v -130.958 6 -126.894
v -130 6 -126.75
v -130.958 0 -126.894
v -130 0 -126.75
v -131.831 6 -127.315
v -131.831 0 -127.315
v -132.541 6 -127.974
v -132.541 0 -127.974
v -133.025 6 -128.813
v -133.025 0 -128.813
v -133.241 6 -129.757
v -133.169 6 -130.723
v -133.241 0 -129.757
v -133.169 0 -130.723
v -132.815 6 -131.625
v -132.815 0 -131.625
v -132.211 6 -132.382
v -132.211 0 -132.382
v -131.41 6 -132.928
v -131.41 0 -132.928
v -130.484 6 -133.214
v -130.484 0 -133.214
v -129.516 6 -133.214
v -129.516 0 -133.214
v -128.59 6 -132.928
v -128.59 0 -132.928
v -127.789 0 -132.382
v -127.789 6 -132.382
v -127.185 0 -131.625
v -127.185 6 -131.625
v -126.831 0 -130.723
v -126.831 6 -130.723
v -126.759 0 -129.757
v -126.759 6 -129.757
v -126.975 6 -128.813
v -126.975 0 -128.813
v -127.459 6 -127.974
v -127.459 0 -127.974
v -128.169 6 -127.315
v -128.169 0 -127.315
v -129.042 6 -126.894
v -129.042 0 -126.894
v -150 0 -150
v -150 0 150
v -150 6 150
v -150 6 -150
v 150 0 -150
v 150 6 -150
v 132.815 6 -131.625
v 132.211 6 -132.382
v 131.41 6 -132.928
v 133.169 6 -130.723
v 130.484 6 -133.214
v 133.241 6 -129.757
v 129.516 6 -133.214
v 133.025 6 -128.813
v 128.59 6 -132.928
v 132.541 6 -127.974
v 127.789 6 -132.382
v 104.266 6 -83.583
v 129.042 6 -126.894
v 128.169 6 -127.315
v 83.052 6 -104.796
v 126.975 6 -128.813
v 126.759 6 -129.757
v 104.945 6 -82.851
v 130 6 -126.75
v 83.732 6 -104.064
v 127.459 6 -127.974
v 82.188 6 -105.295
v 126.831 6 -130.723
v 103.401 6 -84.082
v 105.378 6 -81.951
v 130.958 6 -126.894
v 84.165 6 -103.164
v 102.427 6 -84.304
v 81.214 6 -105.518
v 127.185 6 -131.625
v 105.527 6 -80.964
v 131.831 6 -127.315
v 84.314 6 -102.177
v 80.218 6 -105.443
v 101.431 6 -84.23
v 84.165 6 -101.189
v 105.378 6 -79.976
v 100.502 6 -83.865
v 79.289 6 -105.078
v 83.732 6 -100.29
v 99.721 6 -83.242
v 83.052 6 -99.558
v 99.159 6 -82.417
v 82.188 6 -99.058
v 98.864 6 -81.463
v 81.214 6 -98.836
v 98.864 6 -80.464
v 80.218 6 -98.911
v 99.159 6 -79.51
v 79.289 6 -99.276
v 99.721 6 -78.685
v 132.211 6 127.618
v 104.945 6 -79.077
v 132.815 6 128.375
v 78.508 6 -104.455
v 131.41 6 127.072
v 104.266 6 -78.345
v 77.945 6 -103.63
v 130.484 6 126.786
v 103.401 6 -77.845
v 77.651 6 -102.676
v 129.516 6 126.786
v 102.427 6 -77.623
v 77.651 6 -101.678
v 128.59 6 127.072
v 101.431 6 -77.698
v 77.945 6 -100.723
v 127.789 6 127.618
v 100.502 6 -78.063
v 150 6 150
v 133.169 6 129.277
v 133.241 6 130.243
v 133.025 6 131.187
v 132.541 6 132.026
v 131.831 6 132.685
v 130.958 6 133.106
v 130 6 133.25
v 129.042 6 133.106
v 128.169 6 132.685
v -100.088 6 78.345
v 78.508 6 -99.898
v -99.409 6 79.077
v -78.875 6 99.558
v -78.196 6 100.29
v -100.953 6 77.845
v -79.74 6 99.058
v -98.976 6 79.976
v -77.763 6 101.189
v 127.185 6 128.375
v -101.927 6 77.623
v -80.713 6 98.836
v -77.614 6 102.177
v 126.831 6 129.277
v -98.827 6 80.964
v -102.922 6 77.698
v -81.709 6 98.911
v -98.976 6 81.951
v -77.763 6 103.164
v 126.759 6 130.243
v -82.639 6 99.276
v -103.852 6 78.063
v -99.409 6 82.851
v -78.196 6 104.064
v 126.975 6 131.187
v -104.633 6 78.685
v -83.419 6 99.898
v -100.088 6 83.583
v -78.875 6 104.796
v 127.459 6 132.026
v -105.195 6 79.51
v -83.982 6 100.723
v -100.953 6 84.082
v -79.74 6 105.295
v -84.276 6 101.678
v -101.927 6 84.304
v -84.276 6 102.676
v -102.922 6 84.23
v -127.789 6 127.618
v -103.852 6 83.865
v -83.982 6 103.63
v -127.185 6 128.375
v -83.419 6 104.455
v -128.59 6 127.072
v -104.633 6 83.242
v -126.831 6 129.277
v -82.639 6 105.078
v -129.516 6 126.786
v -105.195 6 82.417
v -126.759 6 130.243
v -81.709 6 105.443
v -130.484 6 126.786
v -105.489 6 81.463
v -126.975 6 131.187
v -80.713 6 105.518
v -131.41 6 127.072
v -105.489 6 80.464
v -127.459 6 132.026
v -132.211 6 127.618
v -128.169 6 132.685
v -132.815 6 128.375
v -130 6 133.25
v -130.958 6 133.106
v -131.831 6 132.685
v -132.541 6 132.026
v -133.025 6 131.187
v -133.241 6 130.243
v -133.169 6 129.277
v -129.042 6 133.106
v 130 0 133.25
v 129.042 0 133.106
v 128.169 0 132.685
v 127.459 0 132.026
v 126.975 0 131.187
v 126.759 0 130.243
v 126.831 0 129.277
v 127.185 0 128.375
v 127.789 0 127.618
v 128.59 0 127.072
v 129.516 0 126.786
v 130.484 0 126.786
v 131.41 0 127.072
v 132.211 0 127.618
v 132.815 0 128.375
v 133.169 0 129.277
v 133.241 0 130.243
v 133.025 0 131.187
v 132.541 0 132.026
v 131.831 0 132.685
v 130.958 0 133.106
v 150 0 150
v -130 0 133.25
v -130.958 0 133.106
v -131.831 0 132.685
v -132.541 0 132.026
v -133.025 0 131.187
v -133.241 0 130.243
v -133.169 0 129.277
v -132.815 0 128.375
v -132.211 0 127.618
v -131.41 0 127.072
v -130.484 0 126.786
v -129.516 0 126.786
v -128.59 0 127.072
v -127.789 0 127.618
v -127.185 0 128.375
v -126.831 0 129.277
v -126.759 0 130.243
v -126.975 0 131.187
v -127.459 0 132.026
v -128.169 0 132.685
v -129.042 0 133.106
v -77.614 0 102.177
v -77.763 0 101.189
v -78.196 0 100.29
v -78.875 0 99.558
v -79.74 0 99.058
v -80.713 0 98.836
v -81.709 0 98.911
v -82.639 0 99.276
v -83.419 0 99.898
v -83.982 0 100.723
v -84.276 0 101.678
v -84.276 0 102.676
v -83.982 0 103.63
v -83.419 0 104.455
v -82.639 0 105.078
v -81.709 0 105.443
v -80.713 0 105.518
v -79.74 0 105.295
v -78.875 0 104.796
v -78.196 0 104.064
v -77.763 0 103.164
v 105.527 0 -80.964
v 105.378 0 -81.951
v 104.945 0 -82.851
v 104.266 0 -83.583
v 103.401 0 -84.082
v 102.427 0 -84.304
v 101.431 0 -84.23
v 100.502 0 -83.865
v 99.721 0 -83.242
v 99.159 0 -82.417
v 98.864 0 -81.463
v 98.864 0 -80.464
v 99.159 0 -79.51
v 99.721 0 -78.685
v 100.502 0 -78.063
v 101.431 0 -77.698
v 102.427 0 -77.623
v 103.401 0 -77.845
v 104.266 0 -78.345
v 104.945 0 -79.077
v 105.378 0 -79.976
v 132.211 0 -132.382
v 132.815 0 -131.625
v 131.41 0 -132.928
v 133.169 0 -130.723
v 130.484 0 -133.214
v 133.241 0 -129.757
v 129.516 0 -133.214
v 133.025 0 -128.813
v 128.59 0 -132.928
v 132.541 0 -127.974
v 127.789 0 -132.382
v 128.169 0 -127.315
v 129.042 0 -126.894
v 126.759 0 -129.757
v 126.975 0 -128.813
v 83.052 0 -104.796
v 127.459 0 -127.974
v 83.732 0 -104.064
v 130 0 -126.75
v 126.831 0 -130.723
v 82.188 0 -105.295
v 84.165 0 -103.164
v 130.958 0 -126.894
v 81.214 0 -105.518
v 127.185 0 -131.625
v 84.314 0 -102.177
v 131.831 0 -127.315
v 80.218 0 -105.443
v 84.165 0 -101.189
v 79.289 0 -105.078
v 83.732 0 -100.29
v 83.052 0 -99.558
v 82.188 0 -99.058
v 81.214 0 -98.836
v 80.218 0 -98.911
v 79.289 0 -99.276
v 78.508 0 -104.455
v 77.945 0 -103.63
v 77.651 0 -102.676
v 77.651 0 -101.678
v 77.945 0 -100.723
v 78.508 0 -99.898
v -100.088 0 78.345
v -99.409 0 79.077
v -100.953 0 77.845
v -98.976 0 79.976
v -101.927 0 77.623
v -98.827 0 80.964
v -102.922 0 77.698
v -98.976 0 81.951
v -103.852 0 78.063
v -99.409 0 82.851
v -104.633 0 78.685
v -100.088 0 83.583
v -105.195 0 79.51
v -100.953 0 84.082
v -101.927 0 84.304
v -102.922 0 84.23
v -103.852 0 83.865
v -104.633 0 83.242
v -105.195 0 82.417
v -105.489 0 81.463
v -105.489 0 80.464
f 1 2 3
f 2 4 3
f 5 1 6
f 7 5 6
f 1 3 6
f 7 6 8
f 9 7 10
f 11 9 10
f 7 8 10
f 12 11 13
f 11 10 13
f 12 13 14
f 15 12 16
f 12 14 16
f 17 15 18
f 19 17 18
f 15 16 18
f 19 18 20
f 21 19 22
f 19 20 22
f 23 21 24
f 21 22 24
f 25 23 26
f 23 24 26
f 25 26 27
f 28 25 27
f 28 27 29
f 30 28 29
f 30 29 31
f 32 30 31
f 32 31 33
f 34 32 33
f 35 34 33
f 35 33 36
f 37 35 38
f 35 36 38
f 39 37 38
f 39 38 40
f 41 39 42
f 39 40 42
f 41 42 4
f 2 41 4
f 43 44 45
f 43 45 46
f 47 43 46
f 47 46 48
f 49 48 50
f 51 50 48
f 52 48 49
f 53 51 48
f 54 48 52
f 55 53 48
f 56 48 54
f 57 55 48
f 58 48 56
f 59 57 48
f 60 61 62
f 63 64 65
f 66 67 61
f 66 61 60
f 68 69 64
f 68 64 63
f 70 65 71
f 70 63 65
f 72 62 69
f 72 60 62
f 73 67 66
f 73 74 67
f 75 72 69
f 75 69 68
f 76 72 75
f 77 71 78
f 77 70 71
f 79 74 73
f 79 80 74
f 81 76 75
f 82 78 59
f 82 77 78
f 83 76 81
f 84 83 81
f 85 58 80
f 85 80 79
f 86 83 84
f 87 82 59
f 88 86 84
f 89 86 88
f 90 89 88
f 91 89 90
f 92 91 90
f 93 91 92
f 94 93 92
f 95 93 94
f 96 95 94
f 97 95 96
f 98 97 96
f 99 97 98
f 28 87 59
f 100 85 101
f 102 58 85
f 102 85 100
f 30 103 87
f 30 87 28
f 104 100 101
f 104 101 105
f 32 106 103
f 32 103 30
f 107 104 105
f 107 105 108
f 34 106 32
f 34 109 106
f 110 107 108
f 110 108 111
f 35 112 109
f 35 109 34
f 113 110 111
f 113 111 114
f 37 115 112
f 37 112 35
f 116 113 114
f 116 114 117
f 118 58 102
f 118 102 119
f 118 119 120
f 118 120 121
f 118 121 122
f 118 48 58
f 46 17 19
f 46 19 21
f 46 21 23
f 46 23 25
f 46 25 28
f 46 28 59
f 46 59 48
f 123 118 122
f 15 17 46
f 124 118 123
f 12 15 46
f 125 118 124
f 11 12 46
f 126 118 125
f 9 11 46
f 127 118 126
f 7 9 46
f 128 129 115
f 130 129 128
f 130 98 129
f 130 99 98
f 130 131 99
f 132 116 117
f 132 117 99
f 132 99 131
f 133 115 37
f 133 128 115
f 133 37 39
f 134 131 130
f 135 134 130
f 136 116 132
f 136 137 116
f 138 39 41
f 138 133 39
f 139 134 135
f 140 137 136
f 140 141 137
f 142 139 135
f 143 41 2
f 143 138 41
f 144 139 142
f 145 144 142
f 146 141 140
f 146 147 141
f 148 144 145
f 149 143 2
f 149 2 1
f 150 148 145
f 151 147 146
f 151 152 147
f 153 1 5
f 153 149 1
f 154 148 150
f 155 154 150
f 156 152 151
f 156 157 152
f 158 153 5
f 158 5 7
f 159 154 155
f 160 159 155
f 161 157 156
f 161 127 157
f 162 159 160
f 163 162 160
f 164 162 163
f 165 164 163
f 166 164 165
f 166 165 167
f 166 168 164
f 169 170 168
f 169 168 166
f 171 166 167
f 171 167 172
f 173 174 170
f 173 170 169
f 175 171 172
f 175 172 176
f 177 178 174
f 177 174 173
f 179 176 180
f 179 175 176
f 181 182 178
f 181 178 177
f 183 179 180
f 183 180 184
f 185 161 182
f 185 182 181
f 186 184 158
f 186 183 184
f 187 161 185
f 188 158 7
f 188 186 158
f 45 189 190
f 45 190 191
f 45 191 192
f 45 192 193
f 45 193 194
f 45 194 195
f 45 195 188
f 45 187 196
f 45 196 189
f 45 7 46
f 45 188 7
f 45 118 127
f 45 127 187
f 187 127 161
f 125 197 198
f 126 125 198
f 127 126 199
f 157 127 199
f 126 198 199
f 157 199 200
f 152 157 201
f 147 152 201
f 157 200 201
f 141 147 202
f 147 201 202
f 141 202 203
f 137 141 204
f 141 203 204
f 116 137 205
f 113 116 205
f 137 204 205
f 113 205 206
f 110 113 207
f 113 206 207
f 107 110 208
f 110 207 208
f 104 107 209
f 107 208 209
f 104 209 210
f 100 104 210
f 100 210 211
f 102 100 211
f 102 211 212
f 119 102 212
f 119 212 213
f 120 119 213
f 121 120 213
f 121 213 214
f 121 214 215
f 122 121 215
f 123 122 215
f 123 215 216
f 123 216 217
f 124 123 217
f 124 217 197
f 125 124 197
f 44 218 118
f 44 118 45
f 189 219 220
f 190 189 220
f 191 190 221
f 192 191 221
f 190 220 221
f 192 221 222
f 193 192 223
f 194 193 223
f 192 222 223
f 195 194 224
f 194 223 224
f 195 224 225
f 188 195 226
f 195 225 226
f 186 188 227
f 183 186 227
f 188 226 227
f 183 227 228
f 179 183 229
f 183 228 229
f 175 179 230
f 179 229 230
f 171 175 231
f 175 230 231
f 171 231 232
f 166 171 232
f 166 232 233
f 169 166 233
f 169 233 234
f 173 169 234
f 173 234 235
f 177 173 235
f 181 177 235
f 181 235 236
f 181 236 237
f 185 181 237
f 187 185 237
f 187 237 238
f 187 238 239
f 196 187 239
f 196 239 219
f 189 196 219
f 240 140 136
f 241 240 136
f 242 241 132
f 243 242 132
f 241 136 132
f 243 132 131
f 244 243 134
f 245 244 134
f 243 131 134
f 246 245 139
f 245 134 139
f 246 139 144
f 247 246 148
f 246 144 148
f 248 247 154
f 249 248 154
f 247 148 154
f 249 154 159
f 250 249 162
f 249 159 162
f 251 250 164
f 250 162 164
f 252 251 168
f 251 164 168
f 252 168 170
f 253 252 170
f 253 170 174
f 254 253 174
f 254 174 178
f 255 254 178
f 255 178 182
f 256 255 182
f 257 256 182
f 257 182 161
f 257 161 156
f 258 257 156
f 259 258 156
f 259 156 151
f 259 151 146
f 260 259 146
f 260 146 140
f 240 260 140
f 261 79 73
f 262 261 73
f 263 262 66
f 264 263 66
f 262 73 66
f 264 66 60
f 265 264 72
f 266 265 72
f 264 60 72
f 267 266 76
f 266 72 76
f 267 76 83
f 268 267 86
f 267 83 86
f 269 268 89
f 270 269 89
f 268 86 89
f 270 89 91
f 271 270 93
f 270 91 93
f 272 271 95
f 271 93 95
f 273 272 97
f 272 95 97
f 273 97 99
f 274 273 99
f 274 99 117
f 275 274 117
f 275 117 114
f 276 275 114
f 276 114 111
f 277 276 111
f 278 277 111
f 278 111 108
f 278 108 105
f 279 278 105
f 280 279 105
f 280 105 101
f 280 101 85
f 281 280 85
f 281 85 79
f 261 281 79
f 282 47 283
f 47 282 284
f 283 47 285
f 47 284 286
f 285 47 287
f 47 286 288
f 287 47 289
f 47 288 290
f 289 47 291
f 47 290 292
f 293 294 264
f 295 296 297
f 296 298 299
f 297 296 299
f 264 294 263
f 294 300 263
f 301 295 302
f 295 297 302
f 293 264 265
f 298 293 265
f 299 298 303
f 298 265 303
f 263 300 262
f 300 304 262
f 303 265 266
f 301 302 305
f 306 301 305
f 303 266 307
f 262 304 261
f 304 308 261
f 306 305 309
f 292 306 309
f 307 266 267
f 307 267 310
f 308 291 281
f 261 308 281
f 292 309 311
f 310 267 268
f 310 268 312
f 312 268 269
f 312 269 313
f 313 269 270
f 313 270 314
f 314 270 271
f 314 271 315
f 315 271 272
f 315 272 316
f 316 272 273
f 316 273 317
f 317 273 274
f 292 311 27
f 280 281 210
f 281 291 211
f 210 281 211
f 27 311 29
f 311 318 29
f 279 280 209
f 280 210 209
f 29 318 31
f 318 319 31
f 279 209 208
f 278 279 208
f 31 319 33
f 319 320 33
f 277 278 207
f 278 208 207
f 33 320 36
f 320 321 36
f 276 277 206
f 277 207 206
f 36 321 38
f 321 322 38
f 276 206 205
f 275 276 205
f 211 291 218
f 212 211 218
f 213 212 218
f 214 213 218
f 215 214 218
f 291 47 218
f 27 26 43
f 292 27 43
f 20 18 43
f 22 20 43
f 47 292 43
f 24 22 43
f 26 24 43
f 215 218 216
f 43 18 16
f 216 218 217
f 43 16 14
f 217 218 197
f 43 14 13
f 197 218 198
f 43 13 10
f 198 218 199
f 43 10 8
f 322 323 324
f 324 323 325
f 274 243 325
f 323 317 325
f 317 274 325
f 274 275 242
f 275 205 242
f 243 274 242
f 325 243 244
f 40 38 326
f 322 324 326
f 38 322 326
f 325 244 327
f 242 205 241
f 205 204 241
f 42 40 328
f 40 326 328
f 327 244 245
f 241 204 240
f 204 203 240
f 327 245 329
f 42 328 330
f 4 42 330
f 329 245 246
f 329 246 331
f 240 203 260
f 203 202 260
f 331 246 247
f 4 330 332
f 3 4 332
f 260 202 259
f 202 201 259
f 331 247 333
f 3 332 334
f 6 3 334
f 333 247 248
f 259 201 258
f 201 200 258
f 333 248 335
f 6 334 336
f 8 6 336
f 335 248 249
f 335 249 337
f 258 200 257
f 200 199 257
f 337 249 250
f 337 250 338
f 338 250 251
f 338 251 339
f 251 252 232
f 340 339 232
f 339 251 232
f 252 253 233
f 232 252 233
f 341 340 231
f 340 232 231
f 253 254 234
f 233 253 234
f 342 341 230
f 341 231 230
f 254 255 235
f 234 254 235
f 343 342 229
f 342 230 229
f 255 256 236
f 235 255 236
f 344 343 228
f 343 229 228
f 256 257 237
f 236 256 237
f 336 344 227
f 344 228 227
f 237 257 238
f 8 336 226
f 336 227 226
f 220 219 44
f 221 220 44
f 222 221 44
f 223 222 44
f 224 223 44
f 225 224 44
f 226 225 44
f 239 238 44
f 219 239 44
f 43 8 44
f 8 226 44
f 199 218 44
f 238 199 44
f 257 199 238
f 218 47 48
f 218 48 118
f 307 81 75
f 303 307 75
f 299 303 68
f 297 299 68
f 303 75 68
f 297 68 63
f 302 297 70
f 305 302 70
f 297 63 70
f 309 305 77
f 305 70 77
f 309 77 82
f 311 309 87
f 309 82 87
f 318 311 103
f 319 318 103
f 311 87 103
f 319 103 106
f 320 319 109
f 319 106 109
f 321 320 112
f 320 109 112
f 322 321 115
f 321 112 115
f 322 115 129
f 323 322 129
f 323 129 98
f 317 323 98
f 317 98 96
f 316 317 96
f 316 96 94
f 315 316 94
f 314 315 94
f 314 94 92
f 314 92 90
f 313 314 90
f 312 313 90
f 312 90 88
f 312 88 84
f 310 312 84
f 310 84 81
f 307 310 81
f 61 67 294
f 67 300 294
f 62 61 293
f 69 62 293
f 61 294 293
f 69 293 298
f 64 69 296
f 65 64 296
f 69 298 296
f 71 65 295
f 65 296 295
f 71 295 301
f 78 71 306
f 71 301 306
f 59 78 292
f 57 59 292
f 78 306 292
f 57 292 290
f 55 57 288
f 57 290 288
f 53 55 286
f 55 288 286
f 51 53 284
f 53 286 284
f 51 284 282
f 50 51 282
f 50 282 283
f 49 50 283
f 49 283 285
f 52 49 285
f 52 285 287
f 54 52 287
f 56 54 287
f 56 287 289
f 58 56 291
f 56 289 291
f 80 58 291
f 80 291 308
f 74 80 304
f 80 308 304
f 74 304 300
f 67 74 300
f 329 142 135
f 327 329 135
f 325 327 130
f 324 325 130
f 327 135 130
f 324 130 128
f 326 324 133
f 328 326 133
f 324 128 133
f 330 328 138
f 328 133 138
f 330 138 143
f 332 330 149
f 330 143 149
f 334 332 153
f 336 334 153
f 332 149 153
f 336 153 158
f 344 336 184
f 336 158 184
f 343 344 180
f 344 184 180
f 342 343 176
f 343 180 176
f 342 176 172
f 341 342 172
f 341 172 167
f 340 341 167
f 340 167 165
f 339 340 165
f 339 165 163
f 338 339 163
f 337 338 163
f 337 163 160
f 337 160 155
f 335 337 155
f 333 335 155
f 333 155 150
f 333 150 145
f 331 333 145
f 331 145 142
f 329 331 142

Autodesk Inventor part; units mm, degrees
ref_plane "YZ Plane" through (0, 0, 0) normal (1, 0, 0) x (0, 1, 0)
ref_plane "XZ Plane" through (0, 0, 0) normal (0, 1, 0) x (-1, 0, 0)
ref_plane "XY Plane" through (0, 0, 0) normal (0, 0, 1) x (1, 0, 0)
sketch "Sketch1" plane through (0, 0, 0) normal (0, 1, 0) x (-1, 0, 0)
  line L0 (-150, 150) -> (150, 150)
  line L1 (150, 150) -> (150, -150)
  line L2 (150, -150) -> (-150, -150)
  line L3 (-150, -150) -> (-150, 150)
  line L4 (-150, 150) -> (150, -150) construction
  line L5 (150, 150) -> (-150, -150) construction
  point P0 (0, 0)
  dimension "d0" = 300
  dimension "d1" = 300
extrude "Extrusion1" add sketch "Sketch1" along normal blind 6
sketch "Sketch2" plane through (0, 6, 0) normal (0, 1, 0) x (1, 0, 0)
  line L0 (-150, -150) -> (150, -150) projected
  line L1 (150, 150) -> (-150, 150) projected
  line L2 (-150, 150) -> (-150, -150) projected
  line L3 (-150, 150) -> (150, -150) construction
  line L4 (0, 0) -> (-91.5703, -91.5703) construction
  line L5 (0, 0) -> (129.5, 0) construction
  line L6 (-91.5703, -91.5703) -> (-102.1769, -80.9637) construction
  circle A0 centre (-102.1769, -80.9637) radius 3.35
  line L7 (-91.5703, -91.5703) -> (-80.9637, -102.1769) construction
  circle A1 centre (-80.9637, -102.1769) radius 3.35
  circle A2 centre (80.9637, 102.1769) radius 3.35
  circle A3 centre (102.1769, 80.9637) radius 3.35
  dimension "d4" = 129.5
  dimension "d5" = 135
  dimension "d6" = 15
  dimension "d7" = 6.7
extrude "Extrusion2" cut sketch "Sketch2" against normal through all
sketch "Sketch3" plane through (0, 6, 0) normal (0, 1, 0) x (1, 0, 0)
  line L0 (-150, 150) -> (-150, -150) projected
  point P0 (0, 0)
  point P1 (-130, -130)
  point P2 (-130, 130)
  point P3 (130, 130)
  point P4 (130, -130)
  dimension "d17" = 20
hole "Hole1" at (-130, 6, 130) at (-130, 6, -130) at (130, 6, -130) at (130, 6, 130) direction (0, -1, 0) diameter 6.5 end through all
properties part number "Base Plate"
